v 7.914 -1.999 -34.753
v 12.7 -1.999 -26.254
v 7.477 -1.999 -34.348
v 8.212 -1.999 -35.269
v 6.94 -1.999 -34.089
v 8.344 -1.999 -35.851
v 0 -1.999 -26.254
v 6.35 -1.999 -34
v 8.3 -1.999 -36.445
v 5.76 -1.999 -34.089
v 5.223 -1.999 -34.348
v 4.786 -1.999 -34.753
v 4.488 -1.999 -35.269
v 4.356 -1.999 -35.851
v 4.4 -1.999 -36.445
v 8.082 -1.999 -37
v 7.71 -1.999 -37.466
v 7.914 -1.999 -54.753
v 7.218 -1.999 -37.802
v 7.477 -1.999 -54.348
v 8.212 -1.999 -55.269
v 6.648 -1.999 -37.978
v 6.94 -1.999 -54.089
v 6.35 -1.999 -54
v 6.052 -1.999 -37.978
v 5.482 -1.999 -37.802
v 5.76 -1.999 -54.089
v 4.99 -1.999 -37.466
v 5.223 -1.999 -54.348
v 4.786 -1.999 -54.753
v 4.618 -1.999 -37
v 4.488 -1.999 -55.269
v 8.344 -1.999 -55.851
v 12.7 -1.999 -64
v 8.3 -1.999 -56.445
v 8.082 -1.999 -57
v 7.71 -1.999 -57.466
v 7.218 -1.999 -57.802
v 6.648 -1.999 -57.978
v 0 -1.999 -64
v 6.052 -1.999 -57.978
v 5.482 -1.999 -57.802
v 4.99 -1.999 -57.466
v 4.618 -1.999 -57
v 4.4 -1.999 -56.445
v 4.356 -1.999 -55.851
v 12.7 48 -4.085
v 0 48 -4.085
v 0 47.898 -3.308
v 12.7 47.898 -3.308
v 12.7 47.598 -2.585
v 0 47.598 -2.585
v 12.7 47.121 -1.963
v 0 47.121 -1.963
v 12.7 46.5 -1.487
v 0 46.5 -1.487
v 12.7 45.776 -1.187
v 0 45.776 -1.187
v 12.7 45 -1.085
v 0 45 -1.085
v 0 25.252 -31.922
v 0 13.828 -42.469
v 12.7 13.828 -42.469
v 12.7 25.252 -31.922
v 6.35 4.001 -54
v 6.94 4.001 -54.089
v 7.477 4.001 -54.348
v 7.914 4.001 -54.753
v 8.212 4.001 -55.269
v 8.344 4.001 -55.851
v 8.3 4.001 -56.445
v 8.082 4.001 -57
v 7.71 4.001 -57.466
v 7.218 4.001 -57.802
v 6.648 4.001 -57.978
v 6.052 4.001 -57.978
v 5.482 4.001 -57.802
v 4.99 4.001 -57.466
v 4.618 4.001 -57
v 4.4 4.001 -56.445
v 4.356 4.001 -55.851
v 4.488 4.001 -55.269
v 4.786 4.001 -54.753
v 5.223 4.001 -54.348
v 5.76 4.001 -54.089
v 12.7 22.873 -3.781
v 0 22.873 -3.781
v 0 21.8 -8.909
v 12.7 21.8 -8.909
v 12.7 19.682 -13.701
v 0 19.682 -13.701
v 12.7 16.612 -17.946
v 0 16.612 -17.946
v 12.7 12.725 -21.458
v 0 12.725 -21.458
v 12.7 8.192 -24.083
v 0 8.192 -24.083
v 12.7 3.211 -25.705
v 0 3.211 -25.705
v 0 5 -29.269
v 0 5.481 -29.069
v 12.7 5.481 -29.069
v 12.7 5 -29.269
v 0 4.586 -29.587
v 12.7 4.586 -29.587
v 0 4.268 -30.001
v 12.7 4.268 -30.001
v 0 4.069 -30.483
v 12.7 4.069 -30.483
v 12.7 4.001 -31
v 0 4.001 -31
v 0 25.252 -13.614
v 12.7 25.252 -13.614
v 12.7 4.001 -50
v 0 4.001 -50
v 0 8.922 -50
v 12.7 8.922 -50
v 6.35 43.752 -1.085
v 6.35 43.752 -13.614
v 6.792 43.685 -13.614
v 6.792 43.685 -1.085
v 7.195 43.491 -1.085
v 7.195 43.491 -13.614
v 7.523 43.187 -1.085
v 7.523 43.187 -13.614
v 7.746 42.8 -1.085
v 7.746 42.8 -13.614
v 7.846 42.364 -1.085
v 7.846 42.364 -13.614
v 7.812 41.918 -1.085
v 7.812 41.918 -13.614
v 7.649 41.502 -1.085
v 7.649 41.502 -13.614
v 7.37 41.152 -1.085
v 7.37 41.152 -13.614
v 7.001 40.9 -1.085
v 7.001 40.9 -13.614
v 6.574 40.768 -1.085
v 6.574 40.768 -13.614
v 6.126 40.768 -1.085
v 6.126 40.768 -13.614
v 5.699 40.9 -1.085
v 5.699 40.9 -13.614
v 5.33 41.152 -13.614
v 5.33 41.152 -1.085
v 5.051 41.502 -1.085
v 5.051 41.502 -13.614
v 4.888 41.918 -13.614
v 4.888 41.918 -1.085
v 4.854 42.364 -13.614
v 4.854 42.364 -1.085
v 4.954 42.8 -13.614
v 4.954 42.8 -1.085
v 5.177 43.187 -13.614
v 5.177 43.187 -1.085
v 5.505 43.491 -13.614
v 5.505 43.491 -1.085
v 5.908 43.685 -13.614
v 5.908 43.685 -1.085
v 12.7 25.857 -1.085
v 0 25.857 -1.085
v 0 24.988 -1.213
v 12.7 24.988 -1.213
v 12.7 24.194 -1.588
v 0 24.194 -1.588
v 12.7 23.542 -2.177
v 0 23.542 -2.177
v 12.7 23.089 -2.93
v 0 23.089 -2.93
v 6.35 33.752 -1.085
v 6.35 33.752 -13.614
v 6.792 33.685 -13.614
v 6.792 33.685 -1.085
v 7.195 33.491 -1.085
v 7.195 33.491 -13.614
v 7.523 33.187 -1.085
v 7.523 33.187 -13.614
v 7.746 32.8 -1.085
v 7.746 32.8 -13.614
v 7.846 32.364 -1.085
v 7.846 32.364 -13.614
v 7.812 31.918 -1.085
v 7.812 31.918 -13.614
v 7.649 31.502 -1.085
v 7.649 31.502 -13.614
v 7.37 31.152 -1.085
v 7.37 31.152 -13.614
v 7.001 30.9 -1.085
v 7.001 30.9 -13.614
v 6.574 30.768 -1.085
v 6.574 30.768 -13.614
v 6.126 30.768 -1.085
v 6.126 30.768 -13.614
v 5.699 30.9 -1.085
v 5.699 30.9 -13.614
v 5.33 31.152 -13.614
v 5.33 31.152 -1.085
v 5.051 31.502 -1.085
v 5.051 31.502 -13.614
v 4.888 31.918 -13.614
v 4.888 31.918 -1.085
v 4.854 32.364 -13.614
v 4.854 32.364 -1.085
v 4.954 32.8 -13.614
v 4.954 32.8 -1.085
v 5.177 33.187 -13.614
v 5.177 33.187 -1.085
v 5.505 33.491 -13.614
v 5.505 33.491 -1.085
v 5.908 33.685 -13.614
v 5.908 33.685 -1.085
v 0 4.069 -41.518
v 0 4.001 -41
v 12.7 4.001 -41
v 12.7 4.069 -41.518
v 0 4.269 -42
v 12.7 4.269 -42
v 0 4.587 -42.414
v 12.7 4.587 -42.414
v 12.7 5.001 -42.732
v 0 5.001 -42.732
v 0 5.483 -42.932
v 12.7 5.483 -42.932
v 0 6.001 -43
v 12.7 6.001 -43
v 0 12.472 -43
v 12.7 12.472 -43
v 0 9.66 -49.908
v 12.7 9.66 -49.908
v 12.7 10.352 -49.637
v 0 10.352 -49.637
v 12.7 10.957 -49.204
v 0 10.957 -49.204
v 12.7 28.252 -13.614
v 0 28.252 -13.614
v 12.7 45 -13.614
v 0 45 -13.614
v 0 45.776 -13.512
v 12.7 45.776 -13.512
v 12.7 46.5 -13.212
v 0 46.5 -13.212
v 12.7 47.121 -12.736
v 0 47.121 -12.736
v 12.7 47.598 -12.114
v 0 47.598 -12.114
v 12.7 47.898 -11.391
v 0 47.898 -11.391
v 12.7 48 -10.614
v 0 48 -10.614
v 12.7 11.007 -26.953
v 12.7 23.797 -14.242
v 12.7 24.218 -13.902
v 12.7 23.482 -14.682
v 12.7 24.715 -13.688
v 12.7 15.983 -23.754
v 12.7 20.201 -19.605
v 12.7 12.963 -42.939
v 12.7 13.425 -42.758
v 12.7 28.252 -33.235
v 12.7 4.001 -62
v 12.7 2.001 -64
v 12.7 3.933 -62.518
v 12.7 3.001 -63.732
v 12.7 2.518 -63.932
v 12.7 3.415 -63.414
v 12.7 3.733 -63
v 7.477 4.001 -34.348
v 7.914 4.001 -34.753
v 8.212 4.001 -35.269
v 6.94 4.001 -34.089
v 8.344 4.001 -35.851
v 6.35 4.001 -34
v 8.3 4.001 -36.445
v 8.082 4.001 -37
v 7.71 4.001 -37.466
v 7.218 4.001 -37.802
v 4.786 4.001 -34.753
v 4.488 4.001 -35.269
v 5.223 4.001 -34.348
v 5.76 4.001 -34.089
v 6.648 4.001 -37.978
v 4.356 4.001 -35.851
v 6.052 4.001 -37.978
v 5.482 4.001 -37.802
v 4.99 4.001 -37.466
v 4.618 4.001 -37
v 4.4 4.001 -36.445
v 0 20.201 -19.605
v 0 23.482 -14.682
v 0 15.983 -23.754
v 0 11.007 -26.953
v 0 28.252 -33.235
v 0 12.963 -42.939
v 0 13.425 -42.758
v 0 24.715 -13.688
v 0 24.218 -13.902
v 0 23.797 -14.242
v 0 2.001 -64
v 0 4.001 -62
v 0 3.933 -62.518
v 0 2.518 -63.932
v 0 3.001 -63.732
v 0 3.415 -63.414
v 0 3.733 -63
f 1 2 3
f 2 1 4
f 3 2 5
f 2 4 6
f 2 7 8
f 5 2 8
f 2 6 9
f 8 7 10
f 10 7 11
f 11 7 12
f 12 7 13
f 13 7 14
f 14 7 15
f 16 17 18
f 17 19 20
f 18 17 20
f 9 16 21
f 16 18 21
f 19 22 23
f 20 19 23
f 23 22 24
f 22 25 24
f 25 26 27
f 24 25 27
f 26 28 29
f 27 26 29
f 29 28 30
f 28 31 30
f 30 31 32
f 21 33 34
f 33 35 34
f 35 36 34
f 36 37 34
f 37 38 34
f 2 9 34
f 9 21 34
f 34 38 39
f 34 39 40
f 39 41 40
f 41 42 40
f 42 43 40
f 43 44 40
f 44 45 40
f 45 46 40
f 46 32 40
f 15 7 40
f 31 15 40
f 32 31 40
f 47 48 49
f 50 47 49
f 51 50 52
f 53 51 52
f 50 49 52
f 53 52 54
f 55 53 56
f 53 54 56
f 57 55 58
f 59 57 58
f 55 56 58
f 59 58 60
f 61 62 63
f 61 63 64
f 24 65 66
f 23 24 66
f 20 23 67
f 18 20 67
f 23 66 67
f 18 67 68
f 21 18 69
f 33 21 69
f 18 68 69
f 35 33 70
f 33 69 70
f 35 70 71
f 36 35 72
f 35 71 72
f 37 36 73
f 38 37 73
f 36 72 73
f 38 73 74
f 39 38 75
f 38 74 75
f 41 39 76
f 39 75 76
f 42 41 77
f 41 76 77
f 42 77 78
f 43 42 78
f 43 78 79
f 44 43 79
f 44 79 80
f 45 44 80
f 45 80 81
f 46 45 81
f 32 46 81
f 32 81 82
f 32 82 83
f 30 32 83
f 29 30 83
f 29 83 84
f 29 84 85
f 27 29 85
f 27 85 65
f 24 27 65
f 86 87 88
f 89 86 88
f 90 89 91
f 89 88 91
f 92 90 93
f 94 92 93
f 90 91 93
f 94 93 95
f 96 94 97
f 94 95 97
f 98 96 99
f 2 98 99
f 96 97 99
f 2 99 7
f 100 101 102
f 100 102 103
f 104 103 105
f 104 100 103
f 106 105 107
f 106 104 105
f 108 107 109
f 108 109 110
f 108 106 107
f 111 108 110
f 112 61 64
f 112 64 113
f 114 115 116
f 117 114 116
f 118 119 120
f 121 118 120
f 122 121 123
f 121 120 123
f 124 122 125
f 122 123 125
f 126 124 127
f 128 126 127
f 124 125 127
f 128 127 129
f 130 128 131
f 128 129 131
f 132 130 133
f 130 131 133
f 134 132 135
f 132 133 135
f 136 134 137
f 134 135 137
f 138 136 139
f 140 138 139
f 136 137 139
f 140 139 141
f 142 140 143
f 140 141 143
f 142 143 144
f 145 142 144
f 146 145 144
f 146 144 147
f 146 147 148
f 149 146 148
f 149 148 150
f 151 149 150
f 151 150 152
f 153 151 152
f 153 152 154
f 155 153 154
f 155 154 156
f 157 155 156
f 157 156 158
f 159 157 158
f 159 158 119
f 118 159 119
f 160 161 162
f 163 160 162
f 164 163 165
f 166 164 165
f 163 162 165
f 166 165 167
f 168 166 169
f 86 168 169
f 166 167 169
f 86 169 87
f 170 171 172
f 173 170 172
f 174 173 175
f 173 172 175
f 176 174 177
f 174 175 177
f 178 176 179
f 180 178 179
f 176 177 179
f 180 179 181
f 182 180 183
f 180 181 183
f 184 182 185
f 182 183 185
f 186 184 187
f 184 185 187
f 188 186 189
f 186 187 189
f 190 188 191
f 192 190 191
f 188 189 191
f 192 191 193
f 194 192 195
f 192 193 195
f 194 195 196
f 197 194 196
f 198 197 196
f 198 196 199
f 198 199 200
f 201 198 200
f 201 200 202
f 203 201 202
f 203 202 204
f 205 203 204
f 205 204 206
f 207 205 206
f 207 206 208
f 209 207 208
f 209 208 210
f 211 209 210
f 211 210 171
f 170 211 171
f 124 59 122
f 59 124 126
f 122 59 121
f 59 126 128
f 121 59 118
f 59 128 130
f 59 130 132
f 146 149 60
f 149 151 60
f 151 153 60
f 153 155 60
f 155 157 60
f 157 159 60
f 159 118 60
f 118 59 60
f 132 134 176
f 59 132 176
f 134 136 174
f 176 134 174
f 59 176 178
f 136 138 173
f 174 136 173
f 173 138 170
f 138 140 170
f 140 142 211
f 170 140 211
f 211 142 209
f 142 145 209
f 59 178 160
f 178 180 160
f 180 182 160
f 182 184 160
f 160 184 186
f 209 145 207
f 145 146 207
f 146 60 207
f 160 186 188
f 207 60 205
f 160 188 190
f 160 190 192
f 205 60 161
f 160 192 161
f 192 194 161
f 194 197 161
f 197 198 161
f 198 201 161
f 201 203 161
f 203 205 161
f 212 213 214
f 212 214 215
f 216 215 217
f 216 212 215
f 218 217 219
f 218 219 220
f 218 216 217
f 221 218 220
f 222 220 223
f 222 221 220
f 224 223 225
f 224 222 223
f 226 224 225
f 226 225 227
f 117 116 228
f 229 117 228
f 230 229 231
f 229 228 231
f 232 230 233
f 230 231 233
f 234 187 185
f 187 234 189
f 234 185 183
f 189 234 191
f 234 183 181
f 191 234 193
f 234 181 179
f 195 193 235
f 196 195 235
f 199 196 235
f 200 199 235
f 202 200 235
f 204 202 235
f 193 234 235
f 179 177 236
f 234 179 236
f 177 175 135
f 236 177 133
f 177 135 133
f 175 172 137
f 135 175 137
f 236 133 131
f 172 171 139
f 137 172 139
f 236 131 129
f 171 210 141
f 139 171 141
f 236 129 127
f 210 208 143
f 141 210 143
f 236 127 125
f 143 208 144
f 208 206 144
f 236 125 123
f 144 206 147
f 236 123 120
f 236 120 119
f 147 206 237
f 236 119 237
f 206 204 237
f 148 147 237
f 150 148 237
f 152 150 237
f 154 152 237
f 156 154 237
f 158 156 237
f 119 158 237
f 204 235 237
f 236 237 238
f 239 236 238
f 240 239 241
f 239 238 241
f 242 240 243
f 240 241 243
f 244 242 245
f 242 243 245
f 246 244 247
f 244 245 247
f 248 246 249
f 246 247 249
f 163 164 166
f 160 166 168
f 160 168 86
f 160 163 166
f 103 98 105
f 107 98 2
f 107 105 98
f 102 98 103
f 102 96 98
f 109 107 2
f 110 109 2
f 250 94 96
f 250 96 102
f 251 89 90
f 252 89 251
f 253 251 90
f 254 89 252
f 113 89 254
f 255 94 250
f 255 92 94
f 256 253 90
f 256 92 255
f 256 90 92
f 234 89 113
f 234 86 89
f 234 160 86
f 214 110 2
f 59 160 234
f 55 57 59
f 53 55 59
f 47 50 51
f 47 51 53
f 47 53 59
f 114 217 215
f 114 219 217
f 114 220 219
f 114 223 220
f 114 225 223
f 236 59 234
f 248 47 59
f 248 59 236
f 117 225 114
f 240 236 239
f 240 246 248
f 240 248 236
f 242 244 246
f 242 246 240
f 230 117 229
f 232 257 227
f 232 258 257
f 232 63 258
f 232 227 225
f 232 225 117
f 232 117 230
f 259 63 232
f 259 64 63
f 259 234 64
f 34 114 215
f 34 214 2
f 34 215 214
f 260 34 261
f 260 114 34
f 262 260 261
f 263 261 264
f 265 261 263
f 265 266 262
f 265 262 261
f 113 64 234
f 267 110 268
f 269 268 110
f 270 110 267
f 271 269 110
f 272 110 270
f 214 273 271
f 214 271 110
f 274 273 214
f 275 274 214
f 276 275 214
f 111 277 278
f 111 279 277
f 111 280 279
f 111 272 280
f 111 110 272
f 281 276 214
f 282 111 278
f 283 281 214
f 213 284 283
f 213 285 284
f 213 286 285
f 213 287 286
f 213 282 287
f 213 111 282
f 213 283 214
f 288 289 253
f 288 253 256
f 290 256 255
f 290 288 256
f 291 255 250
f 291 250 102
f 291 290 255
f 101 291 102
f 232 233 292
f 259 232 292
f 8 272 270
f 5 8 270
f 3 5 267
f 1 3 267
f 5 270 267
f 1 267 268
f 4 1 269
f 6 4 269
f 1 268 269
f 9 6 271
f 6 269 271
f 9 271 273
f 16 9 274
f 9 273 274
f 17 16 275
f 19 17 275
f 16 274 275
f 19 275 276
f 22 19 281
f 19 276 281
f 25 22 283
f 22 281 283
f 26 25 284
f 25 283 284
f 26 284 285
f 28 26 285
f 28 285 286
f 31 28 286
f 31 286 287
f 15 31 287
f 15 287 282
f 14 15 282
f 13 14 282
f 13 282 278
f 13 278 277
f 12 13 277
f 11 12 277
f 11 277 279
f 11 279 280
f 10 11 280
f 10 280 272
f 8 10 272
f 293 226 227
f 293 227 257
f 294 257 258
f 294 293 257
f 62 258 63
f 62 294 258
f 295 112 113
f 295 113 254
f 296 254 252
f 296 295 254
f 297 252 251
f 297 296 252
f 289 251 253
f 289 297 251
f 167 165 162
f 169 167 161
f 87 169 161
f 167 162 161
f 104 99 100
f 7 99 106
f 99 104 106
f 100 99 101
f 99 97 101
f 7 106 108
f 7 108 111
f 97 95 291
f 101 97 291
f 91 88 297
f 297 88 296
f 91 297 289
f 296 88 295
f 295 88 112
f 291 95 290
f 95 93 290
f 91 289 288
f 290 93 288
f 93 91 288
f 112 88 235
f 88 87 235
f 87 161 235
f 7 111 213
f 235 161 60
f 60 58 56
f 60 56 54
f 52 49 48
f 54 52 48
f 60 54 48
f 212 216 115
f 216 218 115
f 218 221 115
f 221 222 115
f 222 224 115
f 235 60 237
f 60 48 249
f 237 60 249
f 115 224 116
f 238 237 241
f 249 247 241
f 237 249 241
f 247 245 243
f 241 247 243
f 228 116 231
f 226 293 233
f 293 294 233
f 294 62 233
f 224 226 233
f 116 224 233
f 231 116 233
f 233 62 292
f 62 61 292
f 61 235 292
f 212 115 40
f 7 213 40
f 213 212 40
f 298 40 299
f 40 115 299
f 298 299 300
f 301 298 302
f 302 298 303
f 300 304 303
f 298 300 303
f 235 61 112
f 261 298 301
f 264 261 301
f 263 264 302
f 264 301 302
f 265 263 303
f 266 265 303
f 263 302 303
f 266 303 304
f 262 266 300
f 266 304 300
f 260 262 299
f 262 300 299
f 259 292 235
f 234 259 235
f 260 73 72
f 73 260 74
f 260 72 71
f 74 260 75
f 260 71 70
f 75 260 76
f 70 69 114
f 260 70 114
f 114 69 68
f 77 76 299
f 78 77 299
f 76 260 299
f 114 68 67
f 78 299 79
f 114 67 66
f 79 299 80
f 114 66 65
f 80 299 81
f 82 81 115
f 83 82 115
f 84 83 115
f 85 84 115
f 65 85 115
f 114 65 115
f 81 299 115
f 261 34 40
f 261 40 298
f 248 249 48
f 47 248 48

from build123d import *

# Parameters (mm, degrees)
BOSS_EXTRUDE2_DEPTH   = 12.7
CROQUIS3_R            = 2
CORTAR_EXTRUIR2_DEPTH = 25
CROQUIS5_R            = 1.5
CORTAR_EXTRUIR3_DEPTH = 17


with BuildPart() as part:
    # Sketch1 → Boss-Extrude2 (new body)
    with BuildSketch(Plane(origin=(0, 0, 0), x_dir=(0, 0, -1), z_dir=(1, 0, 0))):
        with BuildLine():
            Line((49.204101374, 10.956842444), (33.23486306, 28.251581588))
            Line((33.23486306, 28.251581588), (13.61439919, 28.251581588))
            Line((13.61439919, 28.251581588), (13.61439919, 39.964229912))
            Line((13.61439919, 39.964229912), (13.61439919, 45))
            ThreePointArc((13.61439919, 45), (12.735719533, 47.121320344), (10.61439919, 48))
            Line((10.61439919, 48), (4.084684606, 48))
            ThreePointArc((4.084684606, 48), (1.963364263, 47.121320344), (1.084684606, 45))
            Line((1.084684606, 45), (1.084684606, 25.857413306))
            ThreePointArc((1.084684606, 25.857413306), (1.858719017, 23.846175579), (3.781402736, 22.872782658))
            ThreePointArc((3.781402736, 22.872782658), (19.803767064, 14.76117498), (26.254053819, -1.999139412))
            Line((26.254053819, -1.999139412), (64, -1.999139412))
            Line((64, -1.999139412), (64, 2.000860588))
            ThreePointArc((64, 2.000860588), (63.414213562, 3.41507415), (62, 4.000860588))
            Line((62, 4.000860588), (50, 4.000860588))
            Line((50, 4.000860588), (50, 8.921667481))
            ThreePointArc((50, 8.921667481), (49.793949187, 10.014300969), (49.204101374, 10.956842444))
        make_face()
        with BuildLine():
            Line((42.469400916, 13.828321623), (31.921640745, 25.251581588))
            Line((31.921640745, 25.251581588), (13.61439919, 25.251581588))
            ThreePointArc((13.61439919, 25.251581588), (13.901973758, 24.218334695), (14.681998331, 23.482223332))
            ThreePointArc((14.681998331, 23.482223332), (23.753909667, 15.98324163), (29.068629616, 5.481429706))
            ThreePointArc((29.068629616, 5.481429706), (29.78321361, 4.413589067), (31, 4.000860588))
            Line((31, 4.000860588), (41, 4.000860588))
            ThreePointArc((41, 4.000860588), (42.414213562, 4.586647025), (43, 6.000860588))
            Line((43, 6.000860588), (43, 12.471538314))
            ThreePointArc((43, 12.471538314), (42.862632792, 13.199960639), (42.469400916, 13.828321623))
        make_face(mode=Mode.SUBTRACT)
    extrude(amount=BOSS_EXTRUDE2_DEPTH)

    # Croquis3 → Cortar-Extruir2 (cut)
    with BuildSketch(Plane(origin=(0, 4.000860588, 0), x_dir=(1, 0, 0), z_dir=(0, 1, 0))):
        with Locations(Location((6.35, 56, 0), (0, 0, 270))):
            Circle(CROQUIS3_R)
        with Locations(Location((6.35, 36, 0), (0, 0, 270))):
            Circle(CROQUIS3_R)
    extrude(amount=-CORTAR_EXTRUIR2_DEPTH, mode=Mode.SUBTRACT)

    # Croquis5 → Cortar-Extruir3 (cut)
    with BuildSketch(Plane(origin=(0, 0, -13.61439919), x_dir=(-1, 0, 0), z_dir=(0, 0, -1))):
        with Locations(Location((-6.35, 32.251581588, 0), (0, 0, 90))):
            Circle(CROQUIS5_R)
        with Locations(Location((-6.35, 42.251581588, 0), (0, 0, 90))):
            Circle(CROQUIS5_R)
    extrude(amount=-CORTAR_EXTRUIR3_DEPTH, mode=Mode.SUBTRACT)


solid = part.part
